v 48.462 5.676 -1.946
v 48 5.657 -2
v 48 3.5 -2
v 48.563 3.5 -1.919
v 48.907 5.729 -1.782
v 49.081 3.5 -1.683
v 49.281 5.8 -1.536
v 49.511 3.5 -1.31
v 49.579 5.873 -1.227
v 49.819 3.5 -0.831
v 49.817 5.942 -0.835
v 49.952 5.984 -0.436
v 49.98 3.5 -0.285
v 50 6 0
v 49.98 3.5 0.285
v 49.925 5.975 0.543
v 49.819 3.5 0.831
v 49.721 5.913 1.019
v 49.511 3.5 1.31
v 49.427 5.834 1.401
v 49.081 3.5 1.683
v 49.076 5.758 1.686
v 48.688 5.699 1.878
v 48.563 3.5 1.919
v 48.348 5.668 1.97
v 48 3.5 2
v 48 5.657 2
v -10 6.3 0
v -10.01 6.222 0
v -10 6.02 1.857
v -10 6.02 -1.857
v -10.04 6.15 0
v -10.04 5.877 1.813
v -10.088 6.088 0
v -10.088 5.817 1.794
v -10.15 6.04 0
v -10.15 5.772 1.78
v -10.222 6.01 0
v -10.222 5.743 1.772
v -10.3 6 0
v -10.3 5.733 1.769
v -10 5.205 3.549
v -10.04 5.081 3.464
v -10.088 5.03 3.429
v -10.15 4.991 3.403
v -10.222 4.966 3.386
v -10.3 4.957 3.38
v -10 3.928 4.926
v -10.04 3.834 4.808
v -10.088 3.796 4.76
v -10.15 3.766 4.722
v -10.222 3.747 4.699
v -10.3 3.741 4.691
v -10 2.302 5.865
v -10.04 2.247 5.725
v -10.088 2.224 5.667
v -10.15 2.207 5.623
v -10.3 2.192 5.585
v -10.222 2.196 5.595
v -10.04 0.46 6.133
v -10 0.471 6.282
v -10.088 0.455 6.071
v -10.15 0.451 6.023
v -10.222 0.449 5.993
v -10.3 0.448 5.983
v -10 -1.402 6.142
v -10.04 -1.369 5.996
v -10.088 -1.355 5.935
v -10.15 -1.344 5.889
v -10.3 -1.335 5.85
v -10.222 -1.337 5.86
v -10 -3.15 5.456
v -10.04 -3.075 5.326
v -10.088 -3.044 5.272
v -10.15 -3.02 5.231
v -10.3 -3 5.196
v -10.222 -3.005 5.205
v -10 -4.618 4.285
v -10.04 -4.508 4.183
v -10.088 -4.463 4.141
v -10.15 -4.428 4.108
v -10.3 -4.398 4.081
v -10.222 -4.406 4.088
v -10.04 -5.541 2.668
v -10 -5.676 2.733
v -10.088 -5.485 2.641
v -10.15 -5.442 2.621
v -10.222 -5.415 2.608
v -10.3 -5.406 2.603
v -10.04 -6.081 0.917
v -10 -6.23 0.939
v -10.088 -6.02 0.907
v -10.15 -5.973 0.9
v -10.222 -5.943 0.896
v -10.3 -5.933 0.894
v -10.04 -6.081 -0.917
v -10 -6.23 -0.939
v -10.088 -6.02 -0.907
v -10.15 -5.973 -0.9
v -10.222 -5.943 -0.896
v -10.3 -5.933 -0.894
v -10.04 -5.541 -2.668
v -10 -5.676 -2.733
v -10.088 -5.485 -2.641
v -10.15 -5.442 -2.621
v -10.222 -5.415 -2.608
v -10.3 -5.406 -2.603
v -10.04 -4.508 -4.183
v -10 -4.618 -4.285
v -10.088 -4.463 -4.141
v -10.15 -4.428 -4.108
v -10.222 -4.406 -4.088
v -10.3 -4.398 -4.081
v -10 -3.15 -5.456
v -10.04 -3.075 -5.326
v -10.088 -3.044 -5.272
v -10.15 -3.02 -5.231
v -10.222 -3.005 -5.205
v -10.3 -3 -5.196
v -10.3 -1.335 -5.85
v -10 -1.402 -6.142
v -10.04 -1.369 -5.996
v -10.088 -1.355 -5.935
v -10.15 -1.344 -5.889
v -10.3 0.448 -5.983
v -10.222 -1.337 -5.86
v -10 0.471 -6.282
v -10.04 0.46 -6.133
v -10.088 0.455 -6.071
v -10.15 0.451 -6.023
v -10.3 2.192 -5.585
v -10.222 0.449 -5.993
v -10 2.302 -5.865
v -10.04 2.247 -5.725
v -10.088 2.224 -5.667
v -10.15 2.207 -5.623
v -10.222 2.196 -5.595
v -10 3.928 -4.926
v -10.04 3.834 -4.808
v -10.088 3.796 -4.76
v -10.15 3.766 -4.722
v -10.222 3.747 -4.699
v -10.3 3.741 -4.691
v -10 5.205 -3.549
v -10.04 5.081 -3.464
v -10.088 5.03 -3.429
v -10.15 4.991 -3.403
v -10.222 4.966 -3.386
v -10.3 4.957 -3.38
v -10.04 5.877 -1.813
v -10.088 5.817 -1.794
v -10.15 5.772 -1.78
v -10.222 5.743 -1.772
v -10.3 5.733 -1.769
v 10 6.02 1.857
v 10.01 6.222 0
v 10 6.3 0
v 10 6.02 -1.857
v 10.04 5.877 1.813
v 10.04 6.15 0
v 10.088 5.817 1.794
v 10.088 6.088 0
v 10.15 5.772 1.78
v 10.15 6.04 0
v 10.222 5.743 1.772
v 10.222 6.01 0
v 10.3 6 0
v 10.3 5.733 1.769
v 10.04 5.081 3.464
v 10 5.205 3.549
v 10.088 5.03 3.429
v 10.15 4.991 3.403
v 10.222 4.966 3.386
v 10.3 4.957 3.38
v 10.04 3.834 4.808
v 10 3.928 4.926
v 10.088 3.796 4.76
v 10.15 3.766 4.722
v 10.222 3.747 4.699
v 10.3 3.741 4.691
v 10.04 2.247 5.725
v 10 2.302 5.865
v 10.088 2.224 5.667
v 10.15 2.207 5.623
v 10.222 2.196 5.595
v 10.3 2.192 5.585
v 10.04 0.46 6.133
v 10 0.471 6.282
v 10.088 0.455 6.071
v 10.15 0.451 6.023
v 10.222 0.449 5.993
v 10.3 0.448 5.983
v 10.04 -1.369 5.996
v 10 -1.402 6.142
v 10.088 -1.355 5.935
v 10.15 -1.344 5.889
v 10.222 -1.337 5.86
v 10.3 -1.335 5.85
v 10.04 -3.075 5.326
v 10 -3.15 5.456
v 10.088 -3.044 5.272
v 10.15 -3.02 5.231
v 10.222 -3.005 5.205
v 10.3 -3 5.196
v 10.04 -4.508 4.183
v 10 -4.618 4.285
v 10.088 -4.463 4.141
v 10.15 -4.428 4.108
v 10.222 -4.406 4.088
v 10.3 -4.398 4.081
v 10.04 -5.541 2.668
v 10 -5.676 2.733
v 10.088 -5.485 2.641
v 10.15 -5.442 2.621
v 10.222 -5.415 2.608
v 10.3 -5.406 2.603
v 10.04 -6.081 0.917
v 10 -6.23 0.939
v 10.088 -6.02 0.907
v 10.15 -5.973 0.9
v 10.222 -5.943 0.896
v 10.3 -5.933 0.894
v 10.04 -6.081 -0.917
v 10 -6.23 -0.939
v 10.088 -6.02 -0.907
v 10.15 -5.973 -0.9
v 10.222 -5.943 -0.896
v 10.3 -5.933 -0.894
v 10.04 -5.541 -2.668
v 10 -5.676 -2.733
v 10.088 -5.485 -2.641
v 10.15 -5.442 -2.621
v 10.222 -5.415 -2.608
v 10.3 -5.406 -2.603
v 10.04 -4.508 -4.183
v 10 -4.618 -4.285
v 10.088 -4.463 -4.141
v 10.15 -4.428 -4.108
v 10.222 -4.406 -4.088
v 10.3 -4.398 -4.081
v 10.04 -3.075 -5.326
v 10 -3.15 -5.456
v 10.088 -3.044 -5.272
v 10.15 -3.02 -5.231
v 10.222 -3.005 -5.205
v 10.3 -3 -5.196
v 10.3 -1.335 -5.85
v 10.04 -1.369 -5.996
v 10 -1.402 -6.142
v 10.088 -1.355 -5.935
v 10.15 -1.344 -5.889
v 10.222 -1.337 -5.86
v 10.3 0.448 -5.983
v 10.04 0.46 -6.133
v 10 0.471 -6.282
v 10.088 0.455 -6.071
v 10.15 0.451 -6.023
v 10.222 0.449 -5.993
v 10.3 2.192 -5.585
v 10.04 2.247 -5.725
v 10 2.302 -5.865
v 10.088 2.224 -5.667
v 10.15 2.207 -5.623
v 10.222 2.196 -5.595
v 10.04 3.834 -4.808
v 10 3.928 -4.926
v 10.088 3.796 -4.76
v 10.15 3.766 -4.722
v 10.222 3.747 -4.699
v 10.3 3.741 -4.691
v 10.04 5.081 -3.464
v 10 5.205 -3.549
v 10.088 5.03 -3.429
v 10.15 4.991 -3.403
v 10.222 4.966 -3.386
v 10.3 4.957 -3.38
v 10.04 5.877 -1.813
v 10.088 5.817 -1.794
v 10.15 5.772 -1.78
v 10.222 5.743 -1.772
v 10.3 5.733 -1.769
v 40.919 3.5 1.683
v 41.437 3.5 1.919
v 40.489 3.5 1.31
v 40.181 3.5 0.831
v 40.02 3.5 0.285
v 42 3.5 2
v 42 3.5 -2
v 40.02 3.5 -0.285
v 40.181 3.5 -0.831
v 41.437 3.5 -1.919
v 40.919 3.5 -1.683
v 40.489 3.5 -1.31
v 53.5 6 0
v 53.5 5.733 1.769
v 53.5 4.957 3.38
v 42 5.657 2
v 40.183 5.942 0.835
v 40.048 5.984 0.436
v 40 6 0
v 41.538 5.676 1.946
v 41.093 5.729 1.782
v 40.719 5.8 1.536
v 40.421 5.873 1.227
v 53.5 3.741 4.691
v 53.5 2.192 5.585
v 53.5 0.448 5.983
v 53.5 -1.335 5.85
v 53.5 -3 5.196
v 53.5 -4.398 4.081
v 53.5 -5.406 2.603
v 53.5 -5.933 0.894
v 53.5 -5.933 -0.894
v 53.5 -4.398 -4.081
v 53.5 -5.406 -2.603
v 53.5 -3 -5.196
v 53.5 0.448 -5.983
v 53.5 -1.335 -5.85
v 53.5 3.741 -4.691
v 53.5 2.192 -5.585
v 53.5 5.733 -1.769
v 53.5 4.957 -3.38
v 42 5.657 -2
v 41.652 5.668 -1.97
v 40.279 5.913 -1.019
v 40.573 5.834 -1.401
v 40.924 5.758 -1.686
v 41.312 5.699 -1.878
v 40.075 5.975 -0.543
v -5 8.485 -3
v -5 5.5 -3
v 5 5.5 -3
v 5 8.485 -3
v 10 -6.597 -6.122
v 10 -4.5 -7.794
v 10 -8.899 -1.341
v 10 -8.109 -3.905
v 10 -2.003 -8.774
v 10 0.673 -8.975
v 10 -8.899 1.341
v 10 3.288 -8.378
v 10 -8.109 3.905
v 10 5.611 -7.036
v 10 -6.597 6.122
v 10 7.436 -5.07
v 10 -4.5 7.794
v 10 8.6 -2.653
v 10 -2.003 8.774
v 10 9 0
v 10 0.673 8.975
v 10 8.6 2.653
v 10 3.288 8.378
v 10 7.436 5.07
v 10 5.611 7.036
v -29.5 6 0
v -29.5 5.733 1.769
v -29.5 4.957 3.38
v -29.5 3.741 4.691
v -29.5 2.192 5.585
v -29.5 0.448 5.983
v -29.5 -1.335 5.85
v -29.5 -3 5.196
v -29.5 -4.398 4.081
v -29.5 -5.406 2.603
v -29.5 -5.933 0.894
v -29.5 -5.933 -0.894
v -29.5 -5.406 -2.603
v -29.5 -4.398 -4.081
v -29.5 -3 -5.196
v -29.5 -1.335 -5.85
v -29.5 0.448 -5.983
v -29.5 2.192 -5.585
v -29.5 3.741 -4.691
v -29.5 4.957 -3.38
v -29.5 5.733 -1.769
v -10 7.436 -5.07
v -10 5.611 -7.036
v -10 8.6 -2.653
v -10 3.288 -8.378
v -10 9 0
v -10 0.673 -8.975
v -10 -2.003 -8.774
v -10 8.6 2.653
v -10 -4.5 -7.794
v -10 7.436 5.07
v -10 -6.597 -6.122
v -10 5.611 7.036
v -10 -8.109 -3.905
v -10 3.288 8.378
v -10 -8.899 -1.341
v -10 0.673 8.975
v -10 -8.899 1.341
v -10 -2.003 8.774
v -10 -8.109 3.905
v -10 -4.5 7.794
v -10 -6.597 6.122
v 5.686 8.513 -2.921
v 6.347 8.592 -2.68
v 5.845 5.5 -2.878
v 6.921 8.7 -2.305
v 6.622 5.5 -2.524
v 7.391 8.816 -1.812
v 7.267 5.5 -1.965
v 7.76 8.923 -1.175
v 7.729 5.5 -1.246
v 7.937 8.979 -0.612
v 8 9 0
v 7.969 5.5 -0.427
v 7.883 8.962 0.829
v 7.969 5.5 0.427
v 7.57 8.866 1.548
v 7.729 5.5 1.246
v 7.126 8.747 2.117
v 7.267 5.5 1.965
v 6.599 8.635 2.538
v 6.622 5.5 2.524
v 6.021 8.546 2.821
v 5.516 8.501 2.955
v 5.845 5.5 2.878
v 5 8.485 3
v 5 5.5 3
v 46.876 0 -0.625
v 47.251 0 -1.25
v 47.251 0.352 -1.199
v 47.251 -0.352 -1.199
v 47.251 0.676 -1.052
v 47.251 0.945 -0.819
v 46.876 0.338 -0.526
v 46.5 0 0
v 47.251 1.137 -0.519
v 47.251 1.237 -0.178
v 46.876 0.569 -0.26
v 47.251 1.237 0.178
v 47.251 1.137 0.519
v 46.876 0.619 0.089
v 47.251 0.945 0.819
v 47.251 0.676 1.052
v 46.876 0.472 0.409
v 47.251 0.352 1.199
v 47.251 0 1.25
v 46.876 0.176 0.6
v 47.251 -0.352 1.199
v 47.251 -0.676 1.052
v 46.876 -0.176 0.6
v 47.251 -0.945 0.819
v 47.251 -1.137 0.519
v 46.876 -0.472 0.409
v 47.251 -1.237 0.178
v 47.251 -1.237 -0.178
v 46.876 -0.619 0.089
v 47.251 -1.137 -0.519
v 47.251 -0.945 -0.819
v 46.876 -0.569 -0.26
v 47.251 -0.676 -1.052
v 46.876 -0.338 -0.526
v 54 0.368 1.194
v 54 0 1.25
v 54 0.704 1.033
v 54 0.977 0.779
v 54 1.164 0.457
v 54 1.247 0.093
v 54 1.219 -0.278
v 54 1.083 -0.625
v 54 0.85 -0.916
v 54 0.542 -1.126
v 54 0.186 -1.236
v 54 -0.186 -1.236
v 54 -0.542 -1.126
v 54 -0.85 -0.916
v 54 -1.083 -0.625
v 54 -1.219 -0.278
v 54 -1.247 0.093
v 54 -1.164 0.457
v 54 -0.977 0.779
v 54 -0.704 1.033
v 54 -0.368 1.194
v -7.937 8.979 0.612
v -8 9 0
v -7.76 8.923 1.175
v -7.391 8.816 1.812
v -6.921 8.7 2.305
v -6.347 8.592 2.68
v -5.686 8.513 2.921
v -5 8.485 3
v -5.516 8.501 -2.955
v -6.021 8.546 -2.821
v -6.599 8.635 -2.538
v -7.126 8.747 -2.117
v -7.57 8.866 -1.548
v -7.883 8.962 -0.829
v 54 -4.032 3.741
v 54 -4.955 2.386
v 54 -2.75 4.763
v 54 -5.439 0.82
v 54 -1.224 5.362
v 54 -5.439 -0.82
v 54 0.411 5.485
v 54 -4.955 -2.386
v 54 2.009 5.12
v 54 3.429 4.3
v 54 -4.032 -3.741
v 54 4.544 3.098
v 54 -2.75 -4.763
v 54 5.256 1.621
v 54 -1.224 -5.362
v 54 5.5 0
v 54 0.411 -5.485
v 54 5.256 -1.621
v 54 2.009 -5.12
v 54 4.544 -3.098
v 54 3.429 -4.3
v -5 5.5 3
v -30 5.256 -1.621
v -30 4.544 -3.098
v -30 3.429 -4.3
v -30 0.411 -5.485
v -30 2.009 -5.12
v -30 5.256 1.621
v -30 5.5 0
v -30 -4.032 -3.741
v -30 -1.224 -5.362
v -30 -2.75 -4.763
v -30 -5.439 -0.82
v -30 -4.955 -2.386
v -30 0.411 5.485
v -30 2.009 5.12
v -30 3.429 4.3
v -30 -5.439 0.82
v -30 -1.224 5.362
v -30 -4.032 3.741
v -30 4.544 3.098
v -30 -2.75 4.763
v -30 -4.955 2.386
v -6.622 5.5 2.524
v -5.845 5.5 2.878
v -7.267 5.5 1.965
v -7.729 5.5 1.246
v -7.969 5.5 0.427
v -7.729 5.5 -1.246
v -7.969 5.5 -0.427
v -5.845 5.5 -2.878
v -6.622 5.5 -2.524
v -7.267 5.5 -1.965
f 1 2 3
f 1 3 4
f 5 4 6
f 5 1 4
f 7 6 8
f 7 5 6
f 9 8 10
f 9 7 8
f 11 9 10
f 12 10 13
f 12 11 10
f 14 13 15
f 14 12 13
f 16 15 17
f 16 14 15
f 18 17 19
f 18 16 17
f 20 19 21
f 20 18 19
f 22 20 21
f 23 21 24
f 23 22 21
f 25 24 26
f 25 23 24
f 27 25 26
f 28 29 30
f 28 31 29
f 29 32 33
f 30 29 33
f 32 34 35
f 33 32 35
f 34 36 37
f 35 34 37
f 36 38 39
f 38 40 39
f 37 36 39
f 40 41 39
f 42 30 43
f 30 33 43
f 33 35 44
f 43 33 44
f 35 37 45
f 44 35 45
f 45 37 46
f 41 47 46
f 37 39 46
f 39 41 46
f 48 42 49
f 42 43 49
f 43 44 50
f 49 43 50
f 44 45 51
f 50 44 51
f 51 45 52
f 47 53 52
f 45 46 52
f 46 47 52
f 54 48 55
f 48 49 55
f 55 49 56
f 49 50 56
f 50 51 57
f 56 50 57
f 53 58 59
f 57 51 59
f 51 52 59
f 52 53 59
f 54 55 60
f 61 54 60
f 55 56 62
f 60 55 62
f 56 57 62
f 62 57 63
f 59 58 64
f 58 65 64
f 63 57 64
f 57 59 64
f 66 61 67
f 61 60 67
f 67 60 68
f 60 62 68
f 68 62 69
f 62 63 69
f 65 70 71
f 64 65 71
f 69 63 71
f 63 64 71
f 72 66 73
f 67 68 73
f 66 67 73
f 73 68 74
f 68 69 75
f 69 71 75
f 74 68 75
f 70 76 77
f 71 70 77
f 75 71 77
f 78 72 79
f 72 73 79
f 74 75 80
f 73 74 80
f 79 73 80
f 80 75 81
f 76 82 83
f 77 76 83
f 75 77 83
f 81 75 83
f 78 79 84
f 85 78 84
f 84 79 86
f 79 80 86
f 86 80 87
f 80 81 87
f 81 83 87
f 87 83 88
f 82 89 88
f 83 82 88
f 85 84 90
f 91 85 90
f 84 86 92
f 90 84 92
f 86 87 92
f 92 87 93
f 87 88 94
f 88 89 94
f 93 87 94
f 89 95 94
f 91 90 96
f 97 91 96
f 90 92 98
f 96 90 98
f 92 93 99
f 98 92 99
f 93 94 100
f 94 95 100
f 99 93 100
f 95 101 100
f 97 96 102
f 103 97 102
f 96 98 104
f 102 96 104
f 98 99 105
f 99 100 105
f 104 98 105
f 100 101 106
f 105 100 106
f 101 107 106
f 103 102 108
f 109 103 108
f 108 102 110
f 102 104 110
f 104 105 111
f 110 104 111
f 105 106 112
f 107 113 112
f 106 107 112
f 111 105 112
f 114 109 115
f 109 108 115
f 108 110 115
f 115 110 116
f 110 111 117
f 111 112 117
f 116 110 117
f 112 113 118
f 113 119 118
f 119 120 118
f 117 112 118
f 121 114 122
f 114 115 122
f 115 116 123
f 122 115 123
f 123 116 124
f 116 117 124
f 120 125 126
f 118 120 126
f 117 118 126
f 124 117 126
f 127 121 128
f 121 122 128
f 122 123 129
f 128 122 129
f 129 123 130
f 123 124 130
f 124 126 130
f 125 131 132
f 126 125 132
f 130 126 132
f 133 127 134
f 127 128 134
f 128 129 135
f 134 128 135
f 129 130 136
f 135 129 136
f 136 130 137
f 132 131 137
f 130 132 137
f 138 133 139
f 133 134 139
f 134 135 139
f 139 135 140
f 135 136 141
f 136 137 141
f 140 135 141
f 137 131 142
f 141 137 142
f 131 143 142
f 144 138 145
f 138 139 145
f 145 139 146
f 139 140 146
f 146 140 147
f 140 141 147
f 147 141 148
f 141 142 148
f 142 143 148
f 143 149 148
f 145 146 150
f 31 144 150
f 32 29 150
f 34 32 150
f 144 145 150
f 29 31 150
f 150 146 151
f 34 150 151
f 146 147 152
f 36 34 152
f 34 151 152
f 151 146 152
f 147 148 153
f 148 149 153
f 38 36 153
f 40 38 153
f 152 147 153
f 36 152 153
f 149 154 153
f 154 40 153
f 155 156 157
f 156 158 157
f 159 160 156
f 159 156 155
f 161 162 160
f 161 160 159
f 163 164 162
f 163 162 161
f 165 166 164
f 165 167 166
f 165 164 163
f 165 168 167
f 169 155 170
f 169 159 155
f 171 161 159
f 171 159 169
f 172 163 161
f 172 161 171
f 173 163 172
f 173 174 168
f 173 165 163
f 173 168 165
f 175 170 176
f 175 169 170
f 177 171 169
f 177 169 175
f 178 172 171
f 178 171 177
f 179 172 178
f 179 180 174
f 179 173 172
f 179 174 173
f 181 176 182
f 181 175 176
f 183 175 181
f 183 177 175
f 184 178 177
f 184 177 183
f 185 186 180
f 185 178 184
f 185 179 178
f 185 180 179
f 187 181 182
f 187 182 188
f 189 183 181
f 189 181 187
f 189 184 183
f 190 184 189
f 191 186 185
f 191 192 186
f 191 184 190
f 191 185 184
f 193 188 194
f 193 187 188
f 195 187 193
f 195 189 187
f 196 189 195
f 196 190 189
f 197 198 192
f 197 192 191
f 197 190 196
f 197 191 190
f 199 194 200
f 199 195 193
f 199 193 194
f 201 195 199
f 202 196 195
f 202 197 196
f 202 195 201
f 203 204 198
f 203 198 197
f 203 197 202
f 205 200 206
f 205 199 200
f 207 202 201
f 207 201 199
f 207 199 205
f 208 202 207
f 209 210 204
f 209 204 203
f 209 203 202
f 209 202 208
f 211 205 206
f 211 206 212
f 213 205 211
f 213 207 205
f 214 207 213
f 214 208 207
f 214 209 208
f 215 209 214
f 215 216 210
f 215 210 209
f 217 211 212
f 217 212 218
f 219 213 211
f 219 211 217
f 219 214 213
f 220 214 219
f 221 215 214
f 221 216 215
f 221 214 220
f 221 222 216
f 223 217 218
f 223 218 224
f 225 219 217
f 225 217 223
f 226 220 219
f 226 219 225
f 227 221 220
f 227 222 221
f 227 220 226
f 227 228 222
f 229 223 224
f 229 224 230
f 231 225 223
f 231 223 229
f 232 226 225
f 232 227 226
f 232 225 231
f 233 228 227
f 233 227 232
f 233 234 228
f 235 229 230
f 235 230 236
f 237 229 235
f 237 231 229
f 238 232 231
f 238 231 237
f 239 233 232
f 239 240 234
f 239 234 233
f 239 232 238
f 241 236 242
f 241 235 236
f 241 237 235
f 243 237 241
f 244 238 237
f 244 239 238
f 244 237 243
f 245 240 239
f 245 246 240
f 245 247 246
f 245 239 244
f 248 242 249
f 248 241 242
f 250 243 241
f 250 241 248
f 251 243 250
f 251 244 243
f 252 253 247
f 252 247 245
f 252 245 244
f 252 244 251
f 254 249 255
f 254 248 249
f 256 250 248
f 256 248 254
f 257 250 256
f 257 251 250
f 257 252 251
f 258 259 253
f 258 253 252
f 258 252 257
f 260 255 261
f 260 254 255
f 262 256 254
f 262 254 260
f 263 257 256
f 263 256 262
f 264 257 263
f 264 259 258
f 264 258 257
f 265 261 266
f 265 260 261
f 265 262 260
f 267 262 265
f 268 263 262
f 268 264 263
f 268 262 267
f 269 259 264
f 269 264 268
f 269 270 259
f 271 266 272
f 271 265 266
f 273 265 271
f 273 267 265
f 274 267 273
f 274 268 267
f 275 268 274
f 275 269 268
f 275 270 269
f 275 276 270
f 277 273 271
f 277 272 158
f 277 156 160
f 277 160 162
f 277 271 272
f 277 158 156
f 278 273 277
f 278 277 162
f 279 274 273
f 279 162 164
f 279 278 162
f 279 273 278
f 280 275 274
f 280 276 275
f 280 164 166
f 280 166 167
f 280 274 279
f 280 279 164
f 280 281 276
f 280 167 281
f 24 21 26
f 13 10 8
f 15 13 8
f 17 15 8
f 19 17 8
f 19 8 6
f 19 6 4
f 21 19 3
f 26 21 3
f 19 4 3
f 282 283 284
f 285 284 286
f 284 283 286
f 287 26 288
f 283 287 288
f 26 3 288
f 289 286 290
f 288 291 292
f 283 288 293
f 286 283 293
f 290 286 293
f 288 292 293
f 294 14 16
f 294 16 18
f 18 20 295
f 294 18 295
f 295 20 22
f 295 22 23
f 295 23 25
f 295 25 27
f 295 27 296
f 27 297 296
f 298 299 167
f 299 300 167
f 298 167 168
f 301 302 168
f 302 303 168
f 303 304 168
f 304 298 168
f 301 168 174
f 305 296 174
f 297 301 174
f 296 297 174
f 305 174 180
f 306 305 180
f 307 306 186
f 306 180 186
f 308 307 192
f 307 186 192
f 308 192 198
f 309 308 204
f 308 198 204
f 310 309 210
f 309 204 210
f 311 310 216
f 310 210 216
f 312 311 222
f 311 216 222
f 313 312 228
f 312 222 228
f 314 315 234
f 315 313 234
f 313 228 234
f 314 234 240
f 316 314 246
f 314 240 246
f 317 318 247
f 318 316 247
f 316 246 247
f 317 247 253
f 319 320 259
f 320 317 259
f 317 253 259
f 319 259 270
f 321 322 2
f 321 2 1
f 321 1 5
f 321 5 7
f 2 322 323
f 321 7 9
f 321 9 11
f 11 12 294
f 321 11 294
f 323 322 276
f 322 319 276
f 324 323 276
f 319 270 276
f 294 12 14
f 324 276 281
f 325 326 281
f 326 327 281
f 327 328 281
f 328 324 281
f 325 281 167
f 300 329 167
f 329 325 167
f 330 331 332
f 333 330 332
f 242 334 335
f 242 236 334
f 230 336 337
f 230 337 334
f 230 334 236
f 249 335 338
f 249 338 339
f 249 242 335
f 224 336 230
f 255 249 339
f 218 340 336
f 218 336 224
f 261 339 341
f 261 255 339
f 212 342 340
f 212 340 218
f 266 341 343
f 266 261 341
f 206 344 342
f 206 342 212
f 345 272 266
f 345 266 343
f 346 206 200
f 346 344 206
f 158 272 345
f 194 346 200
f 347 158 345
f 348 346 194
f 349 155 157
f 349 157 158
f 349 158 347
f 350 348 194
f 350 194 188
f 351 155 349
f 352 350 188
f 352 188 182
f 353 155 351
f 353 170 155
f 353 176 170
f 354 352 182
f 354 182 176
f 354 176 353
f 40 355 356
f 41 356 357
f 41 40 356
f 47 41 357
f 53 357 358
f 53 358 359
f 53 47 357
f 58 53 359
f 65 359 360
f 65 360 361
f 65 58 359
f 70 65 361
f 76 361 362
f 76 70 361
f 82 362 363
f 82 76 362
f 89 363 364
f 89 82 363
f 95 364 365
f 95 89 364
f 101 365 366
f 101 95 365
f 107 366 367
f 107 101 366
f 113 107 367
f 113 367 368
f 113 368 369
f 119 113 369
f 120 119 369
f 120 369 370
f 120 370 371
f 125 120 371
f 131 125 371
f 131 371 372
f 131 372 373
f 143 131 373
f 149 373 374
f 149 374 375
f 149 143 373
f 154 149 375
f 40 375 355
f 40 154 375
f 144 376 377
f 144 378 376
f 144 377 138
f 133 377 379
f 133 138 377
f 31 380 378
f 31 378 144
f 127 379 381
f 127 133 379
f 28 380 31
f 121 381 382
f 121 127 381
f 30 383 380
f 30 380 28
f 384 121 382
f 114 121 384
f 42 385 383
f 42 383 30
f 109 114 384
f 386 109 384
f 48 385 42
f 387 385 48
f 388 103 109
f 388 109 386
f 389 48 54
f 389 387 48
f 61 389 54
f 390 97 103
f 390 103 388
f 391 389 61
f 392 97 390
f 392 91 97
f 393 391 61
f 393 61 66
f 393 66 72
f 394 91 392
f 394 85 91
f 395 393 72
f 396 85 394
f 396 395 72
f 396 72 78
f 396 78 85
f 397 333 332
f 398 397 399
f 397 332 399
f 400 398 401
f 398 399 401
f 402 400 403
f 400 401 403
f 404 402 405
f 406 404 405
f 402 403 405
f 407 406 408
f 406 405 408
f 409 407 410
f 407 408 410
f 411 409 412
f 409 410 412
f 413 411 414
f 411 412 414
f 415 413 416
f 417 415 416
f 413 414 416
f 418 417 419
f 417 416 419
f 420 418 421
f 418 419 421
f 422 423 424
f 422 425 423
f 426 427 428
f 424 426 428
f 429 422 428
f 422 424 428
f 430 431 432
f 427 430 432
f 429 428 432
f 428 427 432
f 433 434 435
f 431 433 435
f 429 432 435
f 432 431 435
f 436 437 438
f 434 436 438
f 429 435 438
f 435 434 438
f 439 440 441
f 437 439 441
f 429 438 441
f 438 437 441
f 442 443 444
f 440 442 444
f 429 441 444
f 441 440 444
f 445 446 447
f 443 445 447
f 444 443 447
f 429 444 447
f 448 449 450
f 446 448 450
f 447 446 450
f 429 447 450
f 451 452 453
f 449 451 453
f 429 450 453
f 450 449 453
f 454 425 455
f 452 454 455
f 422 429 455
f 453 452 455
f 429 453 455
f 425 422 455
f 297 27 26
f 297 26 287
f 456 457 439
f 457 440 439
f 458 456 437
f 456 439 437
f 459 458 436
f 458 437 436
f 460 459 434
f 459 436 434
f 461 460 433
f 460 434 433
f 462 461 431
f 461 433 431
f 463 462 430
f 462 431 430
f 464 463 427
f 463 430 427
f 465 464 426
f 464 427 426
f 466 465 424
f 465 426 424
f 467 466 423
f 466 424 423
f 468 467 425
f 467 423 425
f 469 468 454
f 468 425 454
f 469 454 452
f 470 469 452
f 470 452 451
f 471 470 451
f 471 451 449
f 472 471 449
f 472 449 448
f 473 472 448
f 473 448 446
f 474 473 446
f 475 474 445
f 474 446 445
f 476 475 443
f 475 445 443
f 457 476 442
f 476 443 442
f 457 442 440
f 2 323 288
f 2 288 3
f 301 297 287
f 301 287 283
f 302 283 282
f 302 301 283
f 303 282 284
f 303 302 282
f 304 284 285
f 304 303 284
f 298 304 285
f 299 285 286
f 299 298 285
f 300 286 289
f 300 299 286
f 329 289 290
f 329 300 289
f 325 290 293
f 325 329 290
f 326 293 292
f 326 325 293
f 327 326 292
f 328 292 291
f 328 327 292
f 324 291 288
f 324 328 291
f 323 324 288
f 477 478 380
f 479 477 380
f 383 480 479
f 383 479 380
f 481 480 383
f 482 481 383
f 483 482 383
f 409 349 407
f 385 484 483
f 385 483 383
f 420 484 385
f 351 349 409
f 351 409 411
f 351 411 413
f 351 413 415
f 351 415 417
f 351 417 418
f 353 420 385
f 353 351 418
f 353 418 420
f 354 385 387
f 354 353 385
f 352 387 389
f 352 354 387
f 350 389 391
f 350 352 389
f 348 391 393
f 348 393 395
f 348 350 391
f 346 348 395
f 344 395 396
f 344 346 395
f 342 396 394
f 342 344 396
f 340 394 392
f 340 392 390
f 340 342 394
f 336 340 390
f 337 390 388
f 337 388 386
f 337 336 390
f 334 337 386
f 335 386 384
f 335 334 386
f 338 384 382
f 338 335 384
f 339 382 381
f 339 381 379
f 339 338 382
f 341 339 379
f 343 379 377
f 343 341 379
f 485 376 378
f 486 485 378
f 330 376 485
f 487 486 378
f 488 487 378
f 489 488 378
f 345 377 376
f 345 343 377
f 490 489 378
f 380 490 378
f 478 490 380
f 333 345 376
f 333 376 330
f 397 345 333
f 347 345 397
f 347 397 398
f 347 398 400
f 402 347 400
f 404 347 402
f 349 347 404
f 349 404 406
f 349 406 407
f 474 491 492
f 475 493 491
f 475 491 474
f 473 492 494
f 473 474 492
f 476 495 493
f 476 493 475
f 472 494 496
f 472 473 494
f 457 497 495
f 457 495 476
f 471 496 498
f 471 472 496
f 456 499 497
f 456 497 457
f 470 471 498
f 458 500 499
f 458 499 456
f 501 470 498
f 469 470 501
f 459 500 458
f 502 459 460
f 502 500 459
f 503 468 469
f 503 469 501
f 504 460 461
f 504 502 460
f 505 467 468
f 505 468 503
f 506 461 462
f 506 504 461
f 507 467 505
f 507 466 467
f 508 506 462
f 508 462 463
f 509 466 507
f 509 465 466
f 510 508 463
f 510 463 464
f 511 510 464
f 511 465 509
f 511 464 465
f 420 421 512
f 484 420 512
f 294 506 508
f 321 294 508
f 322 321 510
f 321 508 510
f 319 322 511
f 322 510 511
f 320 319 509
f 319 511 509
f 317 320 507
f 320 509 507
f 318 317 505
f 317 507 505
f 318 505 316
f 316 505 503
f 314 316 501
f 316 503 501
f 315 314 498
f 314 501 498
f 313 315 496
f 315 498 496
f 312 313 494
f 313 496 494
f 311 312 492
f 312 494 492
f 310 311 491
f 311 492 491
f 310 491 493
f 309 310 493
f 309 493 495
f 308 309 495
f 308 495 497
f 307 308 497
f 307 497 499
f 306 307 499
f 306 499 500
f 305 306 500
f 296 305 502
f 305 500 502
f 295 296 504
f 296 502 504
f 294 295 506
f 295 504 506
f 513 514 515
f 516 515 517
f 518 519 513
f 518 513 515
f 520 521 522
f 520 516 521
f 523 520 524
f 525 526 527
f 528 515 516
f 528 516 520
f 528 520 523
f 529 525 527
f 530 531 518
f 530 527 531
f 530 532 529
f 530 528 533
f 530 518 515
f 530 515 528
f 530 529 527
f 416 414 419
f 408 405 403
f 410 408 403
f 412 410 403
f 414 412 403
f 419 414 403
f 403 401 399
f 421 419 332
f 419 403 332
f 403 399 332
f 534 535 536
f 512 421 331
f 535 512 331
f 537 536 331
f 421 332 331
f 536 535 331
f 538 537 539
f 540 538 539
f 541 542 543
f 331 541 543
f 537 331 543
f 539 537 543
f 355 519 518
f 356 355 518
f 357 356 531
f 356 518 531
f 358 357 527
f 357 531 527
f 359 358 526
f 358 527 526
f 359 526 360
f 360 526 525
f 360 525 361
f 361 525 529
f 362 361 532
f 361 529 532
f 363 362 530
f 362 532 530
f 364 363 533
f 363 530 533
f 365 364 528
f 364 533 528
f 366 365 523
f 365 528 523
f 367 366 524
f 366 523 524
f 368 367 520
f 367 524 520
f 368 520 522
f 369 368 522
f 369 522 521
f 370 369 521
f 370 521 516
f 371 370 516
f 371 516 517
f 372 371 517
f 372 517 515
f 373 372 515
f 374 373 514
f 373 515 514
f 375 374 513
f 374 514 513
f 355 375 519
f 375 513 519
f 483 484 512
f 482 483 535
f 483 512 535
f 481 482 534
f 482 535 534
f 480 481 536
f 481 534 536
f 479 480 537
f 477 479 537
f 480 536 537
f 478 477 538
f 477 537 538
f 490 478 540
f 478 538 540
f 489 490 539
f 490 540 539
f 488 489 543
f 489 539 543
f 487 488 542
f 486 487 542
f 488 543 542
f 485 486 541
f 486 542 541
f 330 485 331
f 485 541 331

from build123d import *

# Parameters (mm, degrees)
CUT_EXTRUDE1_START    = 5.5
CUT_EXTRUDE1_DEPTH    = 10
SKETCH8_R             = 6
CUT_EXTRUDE4_DEPTH    = 6
CUT_EXTRUDE5_START    = 6
CUT_EXTRUDE5_DEPTH    = 2.5
FILLET1_R             = 0.3
CHAMFER1_SIZE         = 0.5
M3_TAPPED_HOLE1_D     = 2.5
M3_TAPPED_HOLE1_DEPTH = 6.748924226
M3_TAPPED_HOLE1_TIP   = 0.751075774


with BuildPart() as part:
    # Sketch3 → Revolve1 (revolve)
    with BuildSketch(Plane.XY):
        Polygon((-10, 9), (10, 9), (10, 6), (32, 6), (60, 6), (60, 0), (-30, 0), (-30, 6), (-10, 6), align=None)
    revolve(axis=Axis((-30, 0, 0), (1, 0, 0)))

    # Sketch5 → Cut-Extrude1 (cut)
    with BuildSketch(Plane(origin=(0, 0, 0), x_dir=(1, 0, 0), z_dir=(0, 1, 0)).offset(CUT_EXTRUDE1_START)):
        with BuildLine():
            Line((5, -3), (-5, -3))
            ThreePointArc((-5, -3), (-8, 0), (-5, 3))
            Line((-5, 3), (5, 3))
            ThreePointArc((5, 3), (8, 0), (5, -3))
        make_face()
    extrude(amount=CUT_EXTRUDE1_DEPTH, mode=Mode.SUBTRACT)

    # Sketch8 → Cut-Extrude4 (cut)
    with BuildSketch(Plane(origin=(60, 0, 0), x_dir=(0, 0, -1), z_dir=(1, 0, 0))):
        Circle(SKETCH8_R)
    extrude(amount=-CUT_EXTRUDE4_DEPTH, mode=Mode.SUBTRACT)

    # Sketch9 → Cut-Extrude5 (cut)
    with BuildSketch(Plane(origin=(0, 0, 0), x_dir=(1, 0, 0), z_dir=(0, 1, 0)).offset(CUT_EXTRUDE5_START)):
        with BuildLine():
            Line((42, 2), (48, 2))
            ThreePointArc((48, 2), (50, 0), (48, -2))
            Line((48, -2), (42, -2))
            ThreePointArc((42, -2), (40, 0), (42, 2))
        make_face()
    extrude(amount=-CUT_EXTRUDE5_DEPTH, mode=Mode.SUBTRACT)

    # Fillet1
    fillet1_edges = [part.edges().sort_by_distance(p)[0] for p in [
        (-10, -6, 0),
        (10, -6, 0),
    ]]
    fillet(fillet1_edges, radius=FILLET1_R)

    # Chamfer1
    chamfer1_edges = [part.edges().sort_by_distance(p)[0] for p in [
        (-30, -6, 0),
        (54, -6, 0),
    ]]
    chamfer(chamfer1_edges, length=CHAMFER1_SIZE)

    # M3 Tapped Hole1
    with Locations(Plane(origin=(54, 0, 0), x_dir=(0, 0, -1), z_dir=(1, 0, 0))):
        with Locations((0, 0)):
            Hole(M3_TAPPED_HOLE1_D / 2, depth=M3_TAPPED_HOLE1_DEPTH)
            with Locations((0, 0, -(M3_TAPPED_HOLE1_DEPTH + M3_TAPPED_HOLE1_TIP / 2))):  # 118° drill point
                Cone(0, M3_TAPPED_HOLE1_D / 2, M3_TAPPED_HOLE1_TIP, mode=Mode.SUBTRACT)


solid = part.part
